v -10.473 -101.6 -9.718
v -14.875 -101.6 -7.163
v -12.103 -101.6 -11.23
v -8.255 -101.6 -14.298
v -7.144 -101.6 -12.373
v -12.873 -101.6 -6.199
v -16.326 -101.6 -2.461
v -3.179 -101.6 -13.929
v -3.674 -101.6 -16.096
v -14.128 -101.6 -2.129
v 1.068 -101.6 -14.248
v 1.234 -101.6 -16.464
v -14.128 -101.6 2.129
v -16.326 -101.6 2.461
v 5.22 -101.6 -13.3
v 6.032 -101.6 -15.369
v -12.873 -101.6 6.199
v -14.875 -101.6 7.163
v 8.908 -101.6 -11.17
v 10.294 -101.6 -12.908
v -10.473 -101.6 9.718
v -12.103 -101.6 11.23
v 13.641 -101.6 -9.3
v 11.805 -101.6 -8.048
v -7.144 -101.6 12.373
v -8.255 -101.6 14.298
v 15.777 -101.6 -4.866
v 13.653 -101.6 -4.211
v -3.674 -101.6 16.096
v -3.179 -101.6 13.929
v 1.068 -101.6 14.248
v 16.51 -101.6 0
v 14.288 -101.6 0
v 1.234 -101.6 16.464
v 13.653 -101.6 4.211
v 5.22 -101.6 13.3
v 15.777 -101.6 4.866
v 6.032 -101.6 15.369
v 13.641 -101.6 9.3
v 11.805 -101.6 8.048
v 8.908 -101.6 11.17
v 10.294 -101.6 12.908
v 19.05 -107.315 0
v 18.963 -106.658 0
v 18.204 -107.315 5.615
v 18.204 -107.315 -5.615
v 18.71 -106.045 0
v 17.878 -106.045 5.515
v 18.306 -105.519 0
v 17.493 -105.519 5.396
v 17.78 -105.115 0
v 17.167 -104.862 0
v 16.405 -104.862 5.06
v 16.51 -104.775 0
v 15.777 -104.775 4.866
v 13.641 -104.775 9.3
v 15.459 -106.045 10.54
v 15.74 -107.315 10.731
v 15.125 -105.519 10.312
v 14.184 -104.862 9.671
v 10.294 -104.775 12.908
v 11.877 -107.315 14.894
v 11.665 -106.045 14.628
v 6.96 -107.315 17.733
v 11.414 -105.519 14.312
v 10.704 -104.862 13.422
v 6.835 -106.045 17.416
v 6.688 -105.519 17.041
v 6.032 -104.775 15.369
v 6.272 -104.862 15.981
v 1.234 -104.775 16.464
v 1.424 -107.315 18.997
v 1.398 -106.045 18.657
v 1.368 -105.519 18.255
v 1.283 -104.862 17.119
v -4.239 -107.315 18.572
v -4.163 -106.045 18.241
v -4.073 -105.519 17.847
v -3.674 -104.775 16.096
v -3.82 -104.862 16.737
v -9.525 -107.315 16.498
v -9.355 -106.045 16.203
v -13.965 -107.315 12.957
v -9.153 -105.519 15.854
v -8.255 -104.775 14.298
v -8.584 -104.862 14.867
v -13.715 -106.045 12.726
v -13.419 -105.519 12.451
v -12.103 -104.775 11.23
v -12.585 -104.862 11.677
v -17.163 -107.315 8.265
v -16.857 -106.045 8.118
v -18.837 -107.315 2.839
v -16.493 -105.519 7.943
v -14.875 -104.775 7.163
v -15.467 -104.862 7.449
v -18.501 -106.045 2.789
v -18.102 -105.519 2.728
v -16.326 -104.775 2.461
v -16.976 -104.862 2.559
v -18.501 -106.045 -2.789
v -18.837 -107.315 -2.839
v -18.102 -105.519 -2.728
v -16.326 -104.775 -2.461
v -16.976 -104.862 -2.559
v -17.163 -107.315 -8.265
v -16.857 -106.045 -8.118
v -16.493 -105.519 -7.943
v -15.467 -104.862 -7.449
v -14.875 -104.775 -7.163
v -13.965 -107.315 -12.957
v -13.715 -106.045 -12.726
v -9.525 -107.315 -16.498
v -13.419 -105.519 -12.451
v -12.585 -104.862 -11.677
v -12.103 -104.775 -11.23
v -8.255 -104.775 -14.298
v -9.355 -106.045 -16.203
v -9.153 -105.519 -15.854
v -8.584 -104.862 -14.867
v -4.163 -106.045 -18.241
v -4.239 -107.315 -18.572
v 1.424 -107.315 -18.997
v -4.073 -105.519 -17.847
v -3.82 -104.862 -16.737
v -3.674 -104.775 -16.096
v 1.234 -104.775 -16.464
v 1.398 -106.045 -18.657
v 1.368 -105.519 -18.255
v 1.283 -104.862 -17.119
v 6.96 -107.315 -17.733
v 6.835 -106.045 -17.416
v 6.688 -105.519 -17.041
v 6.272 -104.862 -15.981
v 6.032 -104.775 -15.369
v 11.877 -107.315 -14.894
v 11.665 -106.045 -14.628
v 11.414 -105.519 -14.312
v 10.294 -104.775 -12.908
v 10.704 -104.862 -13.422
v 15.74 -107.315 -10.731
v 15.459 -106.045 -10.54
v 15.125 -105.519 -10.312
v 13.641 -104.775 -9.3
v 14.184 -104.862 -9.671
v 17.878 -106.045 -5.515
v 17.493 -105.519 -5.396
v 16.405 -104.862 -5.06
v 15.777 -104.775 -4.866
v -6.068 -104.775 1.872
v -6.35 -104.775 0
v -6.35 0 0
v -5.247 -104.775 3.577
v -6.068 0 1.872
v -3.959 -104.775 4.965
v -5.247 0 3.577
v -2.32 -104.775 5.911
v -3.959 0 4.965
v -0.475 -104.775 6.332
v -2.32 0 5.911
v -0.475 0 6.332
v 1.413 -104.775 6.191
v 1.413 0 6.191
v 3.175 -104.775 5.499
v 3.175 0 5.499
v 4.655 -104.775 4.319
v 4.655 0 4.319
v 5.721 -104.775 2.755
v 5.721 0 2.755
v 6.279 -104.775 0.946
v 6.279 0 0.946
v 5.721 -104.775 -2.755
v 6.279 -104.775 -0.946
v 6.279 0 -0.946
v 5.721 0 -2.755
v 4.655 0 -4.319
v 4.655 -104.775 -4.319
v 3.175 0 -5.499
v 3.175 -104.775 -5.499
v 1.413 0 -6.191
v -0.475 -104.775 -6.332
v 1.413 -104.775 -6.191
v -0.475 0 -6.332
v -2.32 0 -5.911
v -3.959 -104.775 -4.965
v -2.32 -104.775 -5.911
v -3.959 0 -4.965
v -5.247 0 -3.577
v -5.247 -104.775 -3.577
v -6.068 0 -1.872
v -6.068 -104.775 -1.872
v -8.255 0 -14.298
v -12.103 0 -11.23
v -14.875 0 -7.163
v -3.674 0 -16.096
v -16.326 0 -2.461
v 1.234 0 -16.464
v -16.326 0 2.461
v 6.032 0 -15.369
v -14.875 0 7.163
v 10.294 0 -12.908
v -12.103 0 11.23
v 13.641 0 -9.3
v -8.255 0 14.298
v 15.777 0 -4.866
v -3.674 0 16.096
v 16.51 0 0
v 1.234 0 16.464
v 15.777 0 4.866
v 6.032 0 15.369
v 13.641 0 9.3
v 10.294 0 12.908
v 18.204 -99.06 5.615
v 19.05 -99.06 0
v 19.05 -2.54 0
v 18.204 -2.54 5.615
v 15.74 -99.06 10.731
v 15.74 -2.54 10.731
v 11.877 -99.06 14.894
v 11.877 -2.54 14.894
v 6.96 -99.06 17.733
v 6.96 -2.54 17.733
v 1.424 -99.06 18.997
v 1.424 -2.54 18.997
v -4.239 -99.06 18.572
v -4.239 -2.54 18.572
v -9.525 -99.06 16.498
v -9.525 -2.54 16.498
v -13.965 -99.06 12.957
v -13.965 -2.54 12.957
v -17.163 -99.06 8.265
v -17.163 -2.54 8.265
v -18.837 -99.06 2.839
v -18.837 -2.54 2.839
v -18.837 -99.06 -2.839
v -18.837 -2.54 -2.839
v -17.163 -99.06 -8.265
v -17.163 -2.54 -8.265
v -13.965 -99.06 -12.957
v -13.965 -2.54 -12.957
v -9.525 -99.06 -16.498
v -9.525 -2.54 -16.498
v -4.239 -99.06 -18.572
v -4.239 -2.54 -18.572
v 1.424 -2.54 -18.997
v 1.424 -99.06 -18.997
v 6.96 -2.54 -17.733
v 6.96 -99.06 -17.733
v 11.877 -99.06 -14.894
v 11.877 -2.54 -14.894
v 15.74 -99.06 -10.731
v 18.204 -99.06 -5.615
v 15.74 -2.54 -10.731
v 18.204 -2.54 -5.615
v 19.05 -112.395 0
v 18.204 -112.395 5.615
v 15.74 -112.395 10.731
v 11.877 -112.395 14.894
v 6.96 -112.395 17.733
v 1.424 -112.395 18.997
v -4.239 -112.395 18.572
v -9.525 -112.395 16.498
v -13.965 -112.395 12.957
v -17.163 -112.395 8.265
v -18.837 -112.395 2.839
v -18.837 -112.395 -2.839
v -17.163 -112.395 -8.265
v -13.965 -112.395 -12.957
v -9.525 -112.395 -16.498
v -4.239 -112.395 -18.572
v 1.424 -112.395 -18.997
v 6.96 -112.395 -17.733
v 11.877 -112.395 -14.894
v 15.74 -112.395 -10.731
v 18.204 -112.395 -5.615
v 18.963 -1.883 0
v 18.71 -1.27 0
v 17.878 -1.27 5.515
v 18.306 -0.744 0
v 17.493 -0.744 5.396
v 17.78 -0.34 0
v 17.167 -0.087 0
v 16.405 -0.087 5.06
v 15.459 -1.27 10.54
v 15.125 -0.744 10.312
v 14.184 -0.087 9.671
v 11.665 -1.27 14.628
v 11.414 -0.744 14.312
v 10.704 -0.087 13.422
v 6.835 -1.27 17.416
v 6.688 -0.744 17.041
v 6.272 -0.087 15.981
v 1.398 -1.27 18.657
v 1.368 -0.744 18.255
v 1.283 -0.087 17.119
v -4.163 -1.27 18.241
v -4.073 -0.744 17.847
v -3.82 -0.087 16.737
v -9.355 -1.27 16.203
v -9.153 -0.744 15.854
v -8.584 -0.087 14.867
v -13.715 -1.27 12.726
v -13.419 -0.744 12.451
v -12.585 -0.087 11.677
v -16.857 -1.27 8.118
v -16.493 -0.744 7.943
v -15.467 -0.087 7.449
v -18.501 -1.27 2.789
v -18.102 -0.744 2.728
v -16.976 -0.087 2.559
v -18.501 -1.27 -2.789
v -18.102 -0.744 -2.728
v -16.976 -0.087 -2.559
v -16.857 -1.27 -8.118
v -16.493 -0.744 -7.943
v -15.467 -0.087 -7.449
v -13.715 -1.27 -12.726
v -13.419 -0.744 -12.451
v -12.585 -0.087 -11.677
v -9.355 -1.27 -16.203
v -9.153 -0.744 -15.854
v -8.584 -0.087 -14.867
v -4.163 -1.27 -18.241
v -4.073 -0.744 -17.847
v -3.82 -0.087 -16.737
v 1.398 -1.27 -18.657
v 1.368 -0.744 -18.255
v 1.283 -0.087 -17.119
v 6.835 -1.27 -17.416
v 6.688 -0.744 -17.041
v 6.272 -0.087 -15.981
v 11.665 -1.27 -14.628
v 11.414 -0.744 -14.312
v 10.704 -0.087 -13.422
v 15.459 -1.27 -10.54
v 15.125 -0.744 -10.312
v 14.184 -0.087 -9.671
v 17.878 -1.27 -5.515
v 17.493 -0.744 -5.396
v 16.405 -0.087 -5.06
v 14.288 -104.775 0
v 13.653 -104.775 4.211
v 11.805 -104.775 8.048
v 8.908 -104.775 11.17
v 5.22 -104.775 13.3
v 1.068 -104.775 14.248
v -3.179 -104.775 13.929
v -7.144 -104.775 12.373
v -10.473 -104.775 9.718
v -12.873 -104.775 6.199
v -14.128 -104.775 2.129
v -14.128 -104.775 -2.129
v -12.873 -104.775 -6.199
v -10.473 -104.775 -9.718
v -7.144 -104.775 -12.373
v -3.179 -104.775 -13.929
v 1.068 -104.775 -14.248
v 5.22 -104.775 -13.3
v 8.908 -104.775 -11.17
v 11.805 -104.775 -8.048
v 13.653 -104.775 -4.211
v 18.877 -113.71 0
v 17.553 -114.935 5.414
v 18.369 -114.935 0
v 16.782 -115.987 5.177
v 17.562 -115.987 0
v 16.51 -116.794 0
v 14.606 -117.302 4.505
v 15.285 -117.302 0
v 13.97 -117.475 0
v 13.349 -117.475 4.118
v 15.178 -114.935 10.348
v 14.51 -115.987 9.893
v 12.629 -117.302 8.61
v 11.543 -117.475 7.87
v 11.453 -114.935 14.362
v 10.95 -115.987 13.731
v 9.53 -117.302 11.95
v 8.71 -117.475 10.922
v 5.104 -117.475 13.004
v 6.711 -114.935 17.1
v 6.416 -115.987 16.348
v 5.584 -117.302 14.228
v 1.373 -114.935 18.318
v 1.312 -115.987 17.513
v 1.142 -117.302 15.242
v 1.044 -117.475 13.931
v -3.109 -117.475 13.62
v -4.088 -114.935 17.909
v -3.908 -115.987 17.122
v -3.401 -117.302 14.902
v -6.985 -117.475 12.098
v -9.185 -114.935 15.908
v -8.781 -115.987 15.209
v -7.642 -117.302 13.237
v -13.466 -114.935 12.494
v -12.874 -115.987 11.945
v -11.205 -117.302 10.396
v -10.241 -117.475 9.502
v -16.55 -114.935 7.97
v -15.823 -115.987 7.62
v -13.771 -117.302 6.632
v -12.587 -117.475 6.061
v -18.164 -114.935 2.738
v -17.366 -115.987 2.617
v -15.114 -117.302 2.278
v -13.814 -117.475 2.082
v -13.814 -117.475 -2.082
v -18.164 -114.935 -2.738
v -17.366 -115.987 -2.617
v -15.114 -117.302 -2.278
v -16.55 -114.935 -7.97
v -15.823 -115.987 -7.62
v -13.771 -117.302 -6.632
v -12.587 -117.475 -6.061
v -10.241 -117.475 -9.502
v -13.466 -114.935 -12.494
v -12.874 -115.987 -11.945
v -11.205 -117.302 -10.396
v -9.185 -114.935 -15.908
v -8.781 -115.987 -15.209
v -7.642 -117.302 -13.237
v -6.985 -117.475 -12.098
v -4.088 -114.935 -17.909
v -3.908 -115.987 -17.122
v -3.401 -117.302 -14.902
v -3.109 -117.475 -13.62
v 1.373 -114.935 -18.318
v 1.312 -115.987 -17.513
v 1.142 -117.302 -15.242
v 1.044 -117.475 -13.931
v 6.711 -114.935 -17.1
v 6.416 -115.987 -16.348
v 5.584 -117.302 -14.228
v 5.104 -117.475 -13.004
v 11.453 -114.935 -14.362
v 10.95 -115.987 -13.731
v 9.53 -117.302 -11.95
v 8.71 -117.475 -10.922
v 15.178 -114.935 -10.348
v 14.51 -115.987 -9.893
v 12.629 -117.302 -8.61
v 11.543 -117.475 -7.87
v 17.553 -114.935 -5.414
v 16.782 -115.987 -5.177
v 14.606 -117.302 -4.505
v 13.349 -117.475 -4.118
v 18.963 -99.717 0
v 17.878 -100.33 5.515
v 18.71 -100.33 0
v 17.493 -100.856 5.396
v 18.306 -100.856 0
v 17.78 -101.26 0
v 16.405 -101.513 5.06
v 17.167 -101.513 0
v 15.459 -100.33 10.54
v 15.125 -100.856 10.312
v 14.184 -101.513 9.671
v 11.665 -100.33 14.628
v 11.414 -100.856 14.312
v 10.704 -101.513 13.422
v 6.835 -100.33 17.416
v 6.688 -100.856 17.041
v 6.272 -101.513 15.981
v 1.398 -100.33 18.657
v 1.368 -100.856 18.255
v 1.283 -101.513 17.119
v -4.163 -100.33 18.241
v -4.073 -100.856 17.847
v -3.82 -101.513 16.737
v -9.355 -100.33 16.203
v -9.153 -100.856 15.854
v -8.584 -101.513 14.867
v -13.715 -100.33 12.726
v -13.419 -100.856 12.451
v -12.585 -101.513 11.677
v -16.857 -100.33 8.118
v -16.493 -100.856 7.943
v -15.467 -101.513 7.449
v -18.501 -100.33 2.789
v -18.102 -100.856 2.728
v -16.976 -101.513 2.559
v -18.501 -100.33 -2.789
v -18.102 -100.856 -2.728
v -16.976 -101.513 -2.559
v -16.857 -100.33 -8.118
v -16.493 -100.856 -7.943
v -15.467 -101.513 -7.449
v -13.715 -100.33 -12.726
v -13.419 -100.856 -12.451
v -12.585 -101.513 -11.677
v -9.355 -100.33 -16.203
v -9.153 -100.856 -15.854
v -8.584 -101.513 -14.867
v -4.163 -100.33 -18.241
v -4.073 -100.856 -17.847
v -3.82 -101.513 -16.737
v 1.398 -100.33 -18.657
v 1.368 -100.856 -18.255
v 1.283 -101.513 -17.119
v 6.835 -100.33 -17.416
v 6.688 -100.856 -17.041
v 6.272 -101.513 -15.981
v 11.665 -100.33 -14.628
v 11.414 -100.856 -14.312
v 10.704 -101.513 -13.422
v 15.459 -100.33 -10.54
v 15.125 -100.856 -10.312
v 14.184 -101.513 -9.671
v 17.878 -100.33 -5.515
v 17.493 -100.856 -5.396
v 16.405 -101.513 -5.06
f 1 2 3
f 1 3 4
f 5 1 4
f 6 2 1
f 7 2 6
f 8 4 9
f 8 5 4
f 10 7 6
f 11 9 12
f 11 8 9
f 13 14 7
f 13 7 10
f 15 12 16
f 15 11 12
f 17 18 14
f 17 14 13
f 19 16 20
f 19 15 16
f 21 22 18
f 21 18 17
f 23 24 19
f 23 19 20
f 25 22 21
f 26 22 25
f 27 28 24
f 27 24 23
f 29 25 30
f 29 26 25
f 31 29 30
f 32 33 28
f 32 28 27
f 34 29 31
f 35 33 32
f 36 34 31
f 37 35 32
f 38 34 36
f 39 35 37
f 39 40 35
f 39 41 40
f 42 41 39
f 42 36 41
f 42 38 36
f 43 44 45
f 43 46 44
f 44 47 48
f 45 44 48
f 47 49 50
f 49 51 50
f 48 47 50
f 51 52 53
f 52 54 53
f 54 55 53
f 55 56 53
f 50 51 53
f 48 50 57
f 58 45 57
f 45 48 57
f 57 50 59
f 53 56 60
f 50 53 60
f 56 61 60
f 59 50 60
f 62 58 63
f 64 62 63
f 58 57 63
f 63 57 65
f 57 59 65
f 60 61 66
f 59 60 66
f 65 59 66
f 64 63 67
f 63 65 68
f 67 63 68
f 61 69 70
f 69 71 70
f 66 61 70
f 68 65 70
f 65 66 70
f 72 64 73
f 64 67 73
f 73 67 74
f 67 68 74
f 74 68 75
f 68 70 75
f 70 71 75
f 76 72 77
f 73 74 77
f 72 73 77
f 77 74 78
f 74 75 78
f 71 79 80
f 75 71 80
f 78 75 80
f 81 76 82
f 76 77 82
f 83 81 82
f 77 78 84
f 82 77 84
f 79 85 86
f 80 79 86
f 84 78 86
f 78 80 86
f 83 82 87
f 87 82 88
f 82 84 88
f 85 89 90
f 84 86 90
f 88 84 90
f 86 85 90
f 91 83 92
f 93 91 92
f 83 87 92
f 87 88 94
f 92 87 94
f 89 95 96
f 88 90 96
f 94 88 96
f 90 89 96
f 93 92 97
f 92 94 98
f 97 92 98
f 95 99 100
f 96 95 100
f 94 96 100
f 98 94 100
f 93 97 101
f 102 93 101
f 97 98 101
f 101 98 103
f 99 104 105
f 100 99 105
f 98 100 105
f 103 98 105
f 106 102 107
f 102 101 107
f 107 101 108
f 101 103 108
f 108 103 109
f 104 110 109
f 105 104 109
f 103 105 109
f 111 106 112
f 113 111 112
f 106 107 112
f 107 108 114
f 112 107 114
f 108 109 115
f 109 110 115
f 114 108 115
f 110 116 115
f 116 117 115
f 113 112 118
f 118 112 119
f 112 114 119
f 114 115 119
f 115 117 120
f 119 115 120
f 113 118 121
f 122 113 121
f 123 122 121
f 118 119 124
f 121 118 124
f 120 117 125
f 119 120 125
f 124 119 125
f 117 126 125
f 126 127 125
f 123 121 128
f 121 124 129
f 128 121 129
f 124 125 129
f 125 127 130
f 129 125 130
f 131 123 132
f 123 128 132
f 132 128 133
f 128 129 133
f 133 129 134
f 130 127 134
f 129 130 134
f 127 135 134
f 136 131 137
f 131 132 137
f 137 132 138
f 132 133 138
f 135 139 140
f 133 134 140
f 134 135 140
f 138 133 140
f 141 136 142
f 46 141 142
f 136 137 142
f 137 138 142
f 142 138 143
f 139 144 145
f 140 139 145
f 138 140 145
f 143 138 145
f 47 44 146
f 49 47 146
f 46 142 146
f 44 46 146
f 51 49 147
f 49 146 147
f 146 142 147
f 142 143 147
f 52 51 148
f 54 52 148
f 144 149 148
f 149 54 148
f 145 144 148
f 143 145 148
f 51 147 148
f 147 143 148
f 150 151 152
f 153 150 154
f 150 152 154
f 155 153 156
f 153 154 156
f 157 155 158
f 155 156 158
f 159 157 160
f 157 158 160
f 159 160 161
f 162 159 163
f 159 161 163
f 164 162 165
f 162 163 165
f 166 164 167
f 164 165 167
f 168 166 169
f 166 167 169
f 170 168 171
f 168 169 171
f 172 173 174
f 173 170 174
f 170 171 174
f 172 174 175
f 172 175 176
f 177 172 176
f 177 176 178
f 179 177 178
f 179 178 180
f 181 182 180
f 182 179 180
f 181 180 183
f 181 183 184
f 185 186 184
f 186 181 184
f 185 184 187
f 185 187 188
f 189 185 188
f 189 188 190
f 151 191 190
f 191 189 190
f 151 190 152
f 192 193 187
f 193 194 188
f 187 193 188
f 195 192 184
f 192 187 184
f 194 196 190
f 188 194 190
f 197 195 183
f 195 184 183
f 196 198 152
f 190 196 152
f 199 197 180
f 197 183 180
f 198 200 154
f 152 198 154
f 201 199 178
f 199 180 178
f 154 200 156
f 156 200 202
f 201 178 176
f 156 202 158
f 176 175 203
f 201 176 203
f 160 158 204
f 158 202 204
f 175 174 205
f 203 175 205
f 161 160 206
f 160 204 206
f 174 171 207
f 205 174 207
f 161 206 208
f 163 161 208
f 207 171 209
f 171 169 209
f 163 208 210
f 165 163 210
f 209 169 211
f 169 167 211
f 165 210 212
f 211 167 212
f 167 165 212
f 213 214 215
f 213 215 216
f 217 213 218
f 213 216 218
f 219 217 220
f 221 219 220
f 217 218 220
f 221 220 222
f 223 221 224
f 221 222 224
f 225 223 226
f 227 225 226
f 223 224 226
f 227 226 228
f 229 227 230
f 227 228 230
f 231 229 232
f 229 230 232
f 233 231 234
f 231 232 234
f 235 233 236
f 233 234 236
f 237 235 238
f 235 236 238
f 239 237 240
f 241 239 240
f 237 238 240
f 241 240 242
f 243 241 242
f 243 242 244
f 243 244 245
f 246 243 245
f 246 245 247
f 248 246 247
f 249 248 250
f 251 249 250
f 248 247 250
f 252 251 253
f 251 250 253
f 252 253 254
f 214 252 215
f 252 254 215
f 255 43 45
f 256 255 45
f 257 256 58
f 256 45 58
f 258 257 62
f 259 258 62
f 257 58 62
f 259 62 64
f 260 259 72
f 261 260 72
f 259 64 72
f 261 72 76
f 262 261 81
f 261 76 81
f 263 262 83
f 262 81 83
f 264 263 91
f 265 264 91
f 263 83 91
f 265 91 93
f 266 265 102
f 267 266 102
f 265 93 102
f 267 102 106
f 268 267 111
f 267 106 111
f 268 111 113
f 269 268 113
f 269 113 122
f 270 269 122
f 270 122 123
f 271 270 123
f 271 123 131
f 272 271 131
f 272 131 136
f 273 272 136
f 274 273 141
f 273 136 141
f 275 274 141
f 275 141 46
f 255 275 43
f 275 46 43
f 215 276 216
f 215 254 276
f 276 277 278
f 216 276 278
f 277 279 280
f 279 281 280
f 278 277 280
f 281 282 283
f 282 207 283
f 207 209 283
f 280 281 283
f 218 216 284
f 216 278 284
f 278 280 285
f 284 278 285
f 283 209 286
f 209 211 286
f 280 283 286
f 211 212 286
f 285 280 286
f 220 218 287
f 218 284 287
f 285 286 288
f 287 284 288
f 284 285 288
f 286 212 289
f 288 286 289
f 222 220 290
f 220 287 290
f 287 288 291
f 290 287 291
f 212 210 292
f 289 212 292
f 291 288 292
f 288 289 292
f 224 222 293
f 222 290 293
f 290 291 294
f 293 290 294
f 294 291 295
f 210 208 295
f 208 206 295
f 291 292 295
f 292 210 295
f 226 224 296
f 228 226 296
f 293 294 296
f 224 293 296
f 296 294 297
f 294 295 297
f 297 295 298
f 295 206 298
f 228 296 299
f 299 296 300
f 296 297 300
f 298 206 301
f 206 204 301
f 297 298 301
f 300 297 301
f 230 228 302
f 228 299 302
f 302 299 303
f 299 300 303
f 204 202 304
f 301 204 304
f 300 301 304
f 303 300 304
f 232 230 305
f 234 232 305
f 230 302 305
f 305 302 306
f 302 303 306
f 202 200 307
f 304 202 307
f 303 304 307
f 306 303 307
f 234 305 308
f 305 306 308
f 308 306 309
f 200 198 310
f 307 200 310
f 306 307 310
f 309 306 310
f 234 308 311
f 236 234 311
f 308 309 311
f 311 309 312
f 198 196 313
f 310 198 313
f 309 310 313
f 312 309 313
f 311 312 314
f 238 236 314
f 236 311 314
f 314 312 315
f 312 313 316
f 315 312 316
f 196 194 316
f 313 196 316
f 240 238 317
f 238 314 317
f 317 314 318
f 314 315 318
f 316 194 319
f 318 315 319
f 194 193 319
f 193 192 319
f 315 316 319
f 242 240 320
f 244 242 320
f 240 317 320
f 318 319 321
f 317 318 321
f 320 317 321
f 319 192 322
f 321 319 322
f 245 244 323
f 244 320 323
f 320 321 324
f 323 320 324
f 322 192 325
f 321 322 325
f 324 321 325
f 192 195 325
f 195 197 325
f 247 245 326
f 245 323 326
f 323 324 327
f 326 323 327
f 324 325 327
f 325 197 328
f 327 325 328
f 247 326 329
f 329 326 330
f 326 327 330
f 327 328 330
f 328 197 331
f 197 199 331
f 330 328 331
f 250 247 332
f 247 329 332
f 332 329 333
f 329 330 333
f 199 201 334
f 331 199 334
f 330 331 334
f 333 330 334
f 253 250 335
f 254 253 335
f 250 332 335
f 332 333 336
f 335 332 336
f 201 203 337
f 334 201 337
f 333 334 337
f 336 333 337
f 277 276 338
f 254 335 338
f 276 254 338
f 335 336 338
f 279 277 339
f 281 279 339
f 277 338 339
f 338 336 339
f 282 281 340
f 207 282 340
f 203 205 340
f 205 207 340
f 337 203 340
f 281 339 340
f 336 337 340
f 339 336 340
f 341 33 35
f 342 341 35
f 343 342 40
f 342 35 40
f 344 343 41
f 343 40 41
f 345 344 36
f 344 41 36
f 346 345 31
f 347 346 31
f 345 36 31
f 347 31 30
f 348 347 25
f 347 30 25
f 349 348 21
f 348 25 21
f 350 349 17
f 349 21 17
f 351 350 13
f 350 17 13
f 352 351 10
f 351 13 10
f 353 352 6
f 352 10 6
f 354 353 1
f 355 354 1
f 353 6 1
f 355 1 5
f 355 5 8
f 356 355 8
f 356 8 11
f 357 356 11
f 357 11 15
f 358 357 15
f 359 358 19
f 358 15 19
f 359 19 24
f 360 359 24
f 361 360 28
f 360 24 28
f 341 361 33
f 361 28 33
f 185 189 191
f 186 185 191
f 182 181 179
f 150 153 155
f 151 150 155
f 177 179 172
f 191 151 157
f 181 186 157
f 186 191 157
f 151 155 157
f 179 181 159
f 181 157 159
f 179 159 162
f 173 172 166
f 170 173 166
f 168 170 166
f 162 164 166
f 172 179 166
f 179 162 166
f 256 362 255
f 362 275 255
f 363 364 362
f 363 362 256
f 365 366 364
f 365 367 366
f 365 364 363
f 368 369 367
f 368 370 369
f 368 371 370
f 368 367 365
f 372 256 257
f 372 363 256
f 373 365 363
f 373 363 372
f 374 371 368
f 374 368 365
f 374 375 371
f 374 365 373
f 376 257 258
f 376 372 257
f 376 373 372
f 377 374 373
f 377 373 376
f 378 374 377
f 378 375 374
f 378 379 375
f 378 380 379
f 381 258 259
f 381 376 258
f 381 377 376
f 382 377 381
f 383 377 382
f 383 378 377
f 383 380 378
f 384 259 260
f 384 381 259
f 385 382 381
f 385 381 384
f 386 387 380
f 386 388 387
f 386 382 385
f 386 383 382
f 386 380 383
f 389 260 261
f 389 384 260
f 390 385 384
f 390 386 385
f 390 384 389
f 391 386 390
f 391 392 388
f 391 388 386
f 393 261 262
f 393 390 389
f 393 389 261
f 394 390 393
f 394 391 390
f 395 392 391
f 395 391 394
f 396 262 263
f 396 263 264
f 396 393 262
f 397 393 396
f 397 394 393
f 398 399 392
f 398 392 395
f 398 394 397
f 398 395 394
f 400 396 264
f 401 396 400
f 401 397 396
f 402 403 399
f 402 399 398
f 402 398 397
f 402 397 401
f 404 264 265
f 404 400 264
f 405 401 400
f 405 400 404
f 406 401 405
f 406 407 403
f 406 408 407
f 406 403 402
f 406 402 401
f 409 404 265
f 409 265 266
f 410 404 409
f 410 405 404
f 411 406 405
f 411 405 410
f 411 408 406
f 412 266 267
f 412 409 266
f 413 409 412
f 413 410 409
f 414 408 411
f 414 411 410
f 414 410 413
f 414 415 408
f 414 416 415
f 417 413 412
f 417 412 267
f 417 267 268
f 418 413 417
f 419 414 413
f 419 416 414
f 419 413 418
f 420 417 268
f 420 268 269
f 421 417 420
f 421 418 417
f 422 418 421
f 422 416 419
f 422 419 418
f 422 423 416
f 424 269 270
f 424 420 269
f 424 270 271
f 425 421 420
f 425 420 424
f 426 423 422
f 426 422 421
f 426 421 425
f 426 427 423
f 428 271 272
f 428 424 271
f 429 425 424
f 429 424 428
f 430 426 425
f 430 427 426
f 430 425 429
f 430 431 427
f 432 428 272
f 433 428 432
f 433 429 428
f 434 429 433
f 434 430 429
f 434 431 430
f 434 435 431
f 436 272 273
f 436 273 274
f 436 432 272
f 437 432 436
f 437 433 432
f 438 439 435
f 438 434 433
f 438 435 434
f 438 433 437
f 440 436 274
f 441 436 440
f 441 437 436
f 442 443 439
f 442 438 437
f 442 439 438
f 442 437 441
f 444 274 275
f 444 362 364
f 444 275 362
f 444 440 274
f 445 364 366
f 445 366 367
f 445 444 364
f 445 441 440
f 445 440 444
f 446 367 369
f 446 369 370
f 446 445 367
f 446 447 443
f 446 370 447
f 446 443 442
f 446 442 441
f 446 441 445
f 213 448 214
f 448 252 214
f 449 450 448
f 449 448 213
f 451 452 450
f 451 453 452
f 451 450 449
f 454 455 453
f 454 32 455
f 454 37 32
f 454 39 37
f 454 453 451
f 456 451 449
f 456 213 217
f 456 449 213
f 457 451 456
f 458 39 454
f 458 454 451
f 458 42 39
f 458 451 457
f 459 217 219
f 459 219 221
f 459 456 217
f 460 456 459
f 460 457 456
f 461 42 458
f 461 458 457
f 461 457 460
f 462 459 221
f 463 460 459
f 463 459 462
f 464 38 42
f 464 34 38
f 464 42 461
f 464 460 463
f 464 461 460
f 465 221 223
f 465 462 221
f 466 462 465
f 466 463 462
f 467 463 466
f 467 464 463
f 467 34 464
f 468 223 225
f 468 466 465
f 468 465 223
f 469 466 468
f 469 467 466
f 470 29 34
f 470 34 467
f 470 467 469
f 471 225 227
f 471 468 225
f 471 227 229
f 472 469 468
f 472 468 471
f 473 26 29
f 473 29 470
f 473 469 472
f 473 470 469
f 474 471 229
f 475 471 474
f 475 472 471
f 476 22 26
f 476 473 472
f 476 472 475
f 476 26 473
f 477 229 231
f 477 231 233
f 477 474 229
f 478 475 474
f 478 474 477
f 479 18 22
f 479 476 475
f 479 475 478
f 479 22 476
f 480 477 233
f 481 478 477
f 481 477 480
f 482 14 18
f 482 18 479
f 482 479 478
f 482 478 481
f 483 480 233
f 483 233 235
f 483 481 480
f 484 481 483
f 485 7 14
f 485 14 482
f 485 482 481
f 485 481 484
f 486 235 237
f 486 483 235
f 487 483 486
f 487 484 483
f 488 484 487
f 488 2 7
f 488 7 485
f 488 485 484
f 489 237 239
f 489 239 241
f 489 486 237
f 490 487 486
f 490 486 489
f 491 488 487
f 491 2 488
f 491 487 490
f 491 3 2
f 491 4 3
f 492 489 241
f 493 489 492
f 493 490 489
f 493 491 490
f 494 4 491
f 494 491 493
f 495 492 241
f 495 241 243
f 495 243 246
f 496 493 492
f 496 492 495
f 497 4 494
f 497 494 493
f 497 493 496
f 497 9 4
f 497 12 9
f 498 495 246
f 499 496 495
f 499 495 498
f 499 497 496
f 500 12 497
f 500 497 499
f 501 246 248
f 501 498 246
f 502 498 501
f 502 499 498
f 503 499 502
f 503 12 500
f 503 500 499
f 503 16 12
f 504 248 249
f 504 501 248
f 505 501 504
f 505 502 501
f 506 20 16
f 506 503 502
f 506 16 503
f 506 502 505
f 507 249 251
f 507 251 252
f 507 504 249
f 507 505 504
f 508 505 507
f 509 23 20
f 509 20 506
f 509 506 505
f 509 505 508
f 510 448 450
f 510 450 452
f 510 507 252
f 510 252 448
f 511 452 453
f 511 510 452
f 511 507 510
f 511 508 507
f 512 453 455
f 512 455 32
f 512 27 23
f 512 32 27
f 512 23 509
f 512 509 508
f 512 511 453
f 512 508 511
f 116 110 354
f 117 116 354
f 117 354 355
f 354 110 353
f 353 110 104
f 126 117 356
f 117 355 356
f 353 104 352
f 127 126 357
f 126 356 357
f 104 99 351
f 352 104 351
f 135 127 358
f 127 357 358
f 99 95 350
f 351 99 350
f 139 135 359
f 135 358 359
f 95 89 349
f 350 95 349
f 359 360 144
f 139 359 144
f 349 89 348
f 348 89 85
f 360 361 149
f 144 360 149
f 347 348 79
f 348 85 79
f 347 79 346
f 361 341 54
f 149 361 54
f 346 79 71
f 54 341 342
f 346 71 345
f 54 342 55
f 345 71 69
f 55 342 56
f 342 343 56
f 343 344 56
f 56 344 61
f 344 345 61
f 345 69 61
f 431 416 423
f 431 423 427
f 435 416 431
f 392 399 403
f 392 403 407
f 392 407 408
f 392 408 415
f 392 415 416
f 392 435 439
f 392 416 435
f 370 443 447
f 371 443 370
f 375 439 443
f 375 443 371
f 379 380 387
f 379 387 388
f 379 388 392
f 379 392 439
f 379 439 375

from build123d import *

# Parameters (mm, degrees)
F0_R      = 19.05
F1_DEPTH  = 101.6
F2_R      = 2.54
F5_R      = 14.2875
F5_R_2    = 6.35
F6_DEPTH  = 3.175
F7_R      = 19.05
F7_R_2    = 14.2875
F8_DEPTH  = 25.4
F10_R     = 19.05
F11_DEPTH = 12.7
F12_R     = 2.54
F13_R     = 5.08
F3_R      = 6.35
F14_DEPTH = 104.775


# Not quite as in the source:
# - a feature names something its author has since deleted; it is built from what else it names


with BuildPart() as f1:
    # F0 (on Front) → F1 (new body)
    with BuildSketch(Plane.XZ):
        Circle(F0_R)
    extrude(amount=F1_DEPTH)

    # F2
    f2_edges = [f1.edges().sort_by_distance(p)[0] for p in [
        (-19.05, -101.6, 0),
        (-19.05, 0, 0),
    ]]
    fillet(f2_edges, radius=F2_R)

    # F5 (on face) → F6 (join)
    with BuildSketch(Plane.XZ.offset(101.6)):
        Circle(F5_R)
        Circle(F5_R_2, mode=Mode.SUBTRACT)
    extrude(amount=F6_DEPTH)

    # F10 (on face) → F11 (join)
    with BuildSketch(Plane.XZ.offset(104.775)):
        Circle(F10_R)
    extrude(amount=F11_DEPTH)

    # F12
    f12_edges = [f1.edges().sort_by_distance(p)[0] for p in [
        (-19.05, -104.775, 0),
    ]]
    fillet(f12_edges, radius=F12_R)

    # F13
    f13_edges = [f1.edges().sort_by_distance(p)[0] for p in [
        (-19.05, -117.475, 0),
    ]]
    fillet(f13_edges, radius=F13_R)

    # F3 (on face) → F14 (cut, through all)
    with BuildSketch(Plane(origin=(0, 0, 0), x_dir=(-1, 0, 0), z_dir=(0, 1, 0))):
        Circle(F3_R)
    extrude(amount=-F14_DEPTH, mode=Mode.SUBTRACT)


with BuildPart() as f8:
    # F7 (on face) → F8 (new body)
    with BuildSketch(Plane.XZ.offset(104.775)):
        Circle(F7_R)
        Circle(F7_R_2, mode=Mode.SUBTRACT)
    extrude(amount=F8_DEPTH)


solid = f1.part
